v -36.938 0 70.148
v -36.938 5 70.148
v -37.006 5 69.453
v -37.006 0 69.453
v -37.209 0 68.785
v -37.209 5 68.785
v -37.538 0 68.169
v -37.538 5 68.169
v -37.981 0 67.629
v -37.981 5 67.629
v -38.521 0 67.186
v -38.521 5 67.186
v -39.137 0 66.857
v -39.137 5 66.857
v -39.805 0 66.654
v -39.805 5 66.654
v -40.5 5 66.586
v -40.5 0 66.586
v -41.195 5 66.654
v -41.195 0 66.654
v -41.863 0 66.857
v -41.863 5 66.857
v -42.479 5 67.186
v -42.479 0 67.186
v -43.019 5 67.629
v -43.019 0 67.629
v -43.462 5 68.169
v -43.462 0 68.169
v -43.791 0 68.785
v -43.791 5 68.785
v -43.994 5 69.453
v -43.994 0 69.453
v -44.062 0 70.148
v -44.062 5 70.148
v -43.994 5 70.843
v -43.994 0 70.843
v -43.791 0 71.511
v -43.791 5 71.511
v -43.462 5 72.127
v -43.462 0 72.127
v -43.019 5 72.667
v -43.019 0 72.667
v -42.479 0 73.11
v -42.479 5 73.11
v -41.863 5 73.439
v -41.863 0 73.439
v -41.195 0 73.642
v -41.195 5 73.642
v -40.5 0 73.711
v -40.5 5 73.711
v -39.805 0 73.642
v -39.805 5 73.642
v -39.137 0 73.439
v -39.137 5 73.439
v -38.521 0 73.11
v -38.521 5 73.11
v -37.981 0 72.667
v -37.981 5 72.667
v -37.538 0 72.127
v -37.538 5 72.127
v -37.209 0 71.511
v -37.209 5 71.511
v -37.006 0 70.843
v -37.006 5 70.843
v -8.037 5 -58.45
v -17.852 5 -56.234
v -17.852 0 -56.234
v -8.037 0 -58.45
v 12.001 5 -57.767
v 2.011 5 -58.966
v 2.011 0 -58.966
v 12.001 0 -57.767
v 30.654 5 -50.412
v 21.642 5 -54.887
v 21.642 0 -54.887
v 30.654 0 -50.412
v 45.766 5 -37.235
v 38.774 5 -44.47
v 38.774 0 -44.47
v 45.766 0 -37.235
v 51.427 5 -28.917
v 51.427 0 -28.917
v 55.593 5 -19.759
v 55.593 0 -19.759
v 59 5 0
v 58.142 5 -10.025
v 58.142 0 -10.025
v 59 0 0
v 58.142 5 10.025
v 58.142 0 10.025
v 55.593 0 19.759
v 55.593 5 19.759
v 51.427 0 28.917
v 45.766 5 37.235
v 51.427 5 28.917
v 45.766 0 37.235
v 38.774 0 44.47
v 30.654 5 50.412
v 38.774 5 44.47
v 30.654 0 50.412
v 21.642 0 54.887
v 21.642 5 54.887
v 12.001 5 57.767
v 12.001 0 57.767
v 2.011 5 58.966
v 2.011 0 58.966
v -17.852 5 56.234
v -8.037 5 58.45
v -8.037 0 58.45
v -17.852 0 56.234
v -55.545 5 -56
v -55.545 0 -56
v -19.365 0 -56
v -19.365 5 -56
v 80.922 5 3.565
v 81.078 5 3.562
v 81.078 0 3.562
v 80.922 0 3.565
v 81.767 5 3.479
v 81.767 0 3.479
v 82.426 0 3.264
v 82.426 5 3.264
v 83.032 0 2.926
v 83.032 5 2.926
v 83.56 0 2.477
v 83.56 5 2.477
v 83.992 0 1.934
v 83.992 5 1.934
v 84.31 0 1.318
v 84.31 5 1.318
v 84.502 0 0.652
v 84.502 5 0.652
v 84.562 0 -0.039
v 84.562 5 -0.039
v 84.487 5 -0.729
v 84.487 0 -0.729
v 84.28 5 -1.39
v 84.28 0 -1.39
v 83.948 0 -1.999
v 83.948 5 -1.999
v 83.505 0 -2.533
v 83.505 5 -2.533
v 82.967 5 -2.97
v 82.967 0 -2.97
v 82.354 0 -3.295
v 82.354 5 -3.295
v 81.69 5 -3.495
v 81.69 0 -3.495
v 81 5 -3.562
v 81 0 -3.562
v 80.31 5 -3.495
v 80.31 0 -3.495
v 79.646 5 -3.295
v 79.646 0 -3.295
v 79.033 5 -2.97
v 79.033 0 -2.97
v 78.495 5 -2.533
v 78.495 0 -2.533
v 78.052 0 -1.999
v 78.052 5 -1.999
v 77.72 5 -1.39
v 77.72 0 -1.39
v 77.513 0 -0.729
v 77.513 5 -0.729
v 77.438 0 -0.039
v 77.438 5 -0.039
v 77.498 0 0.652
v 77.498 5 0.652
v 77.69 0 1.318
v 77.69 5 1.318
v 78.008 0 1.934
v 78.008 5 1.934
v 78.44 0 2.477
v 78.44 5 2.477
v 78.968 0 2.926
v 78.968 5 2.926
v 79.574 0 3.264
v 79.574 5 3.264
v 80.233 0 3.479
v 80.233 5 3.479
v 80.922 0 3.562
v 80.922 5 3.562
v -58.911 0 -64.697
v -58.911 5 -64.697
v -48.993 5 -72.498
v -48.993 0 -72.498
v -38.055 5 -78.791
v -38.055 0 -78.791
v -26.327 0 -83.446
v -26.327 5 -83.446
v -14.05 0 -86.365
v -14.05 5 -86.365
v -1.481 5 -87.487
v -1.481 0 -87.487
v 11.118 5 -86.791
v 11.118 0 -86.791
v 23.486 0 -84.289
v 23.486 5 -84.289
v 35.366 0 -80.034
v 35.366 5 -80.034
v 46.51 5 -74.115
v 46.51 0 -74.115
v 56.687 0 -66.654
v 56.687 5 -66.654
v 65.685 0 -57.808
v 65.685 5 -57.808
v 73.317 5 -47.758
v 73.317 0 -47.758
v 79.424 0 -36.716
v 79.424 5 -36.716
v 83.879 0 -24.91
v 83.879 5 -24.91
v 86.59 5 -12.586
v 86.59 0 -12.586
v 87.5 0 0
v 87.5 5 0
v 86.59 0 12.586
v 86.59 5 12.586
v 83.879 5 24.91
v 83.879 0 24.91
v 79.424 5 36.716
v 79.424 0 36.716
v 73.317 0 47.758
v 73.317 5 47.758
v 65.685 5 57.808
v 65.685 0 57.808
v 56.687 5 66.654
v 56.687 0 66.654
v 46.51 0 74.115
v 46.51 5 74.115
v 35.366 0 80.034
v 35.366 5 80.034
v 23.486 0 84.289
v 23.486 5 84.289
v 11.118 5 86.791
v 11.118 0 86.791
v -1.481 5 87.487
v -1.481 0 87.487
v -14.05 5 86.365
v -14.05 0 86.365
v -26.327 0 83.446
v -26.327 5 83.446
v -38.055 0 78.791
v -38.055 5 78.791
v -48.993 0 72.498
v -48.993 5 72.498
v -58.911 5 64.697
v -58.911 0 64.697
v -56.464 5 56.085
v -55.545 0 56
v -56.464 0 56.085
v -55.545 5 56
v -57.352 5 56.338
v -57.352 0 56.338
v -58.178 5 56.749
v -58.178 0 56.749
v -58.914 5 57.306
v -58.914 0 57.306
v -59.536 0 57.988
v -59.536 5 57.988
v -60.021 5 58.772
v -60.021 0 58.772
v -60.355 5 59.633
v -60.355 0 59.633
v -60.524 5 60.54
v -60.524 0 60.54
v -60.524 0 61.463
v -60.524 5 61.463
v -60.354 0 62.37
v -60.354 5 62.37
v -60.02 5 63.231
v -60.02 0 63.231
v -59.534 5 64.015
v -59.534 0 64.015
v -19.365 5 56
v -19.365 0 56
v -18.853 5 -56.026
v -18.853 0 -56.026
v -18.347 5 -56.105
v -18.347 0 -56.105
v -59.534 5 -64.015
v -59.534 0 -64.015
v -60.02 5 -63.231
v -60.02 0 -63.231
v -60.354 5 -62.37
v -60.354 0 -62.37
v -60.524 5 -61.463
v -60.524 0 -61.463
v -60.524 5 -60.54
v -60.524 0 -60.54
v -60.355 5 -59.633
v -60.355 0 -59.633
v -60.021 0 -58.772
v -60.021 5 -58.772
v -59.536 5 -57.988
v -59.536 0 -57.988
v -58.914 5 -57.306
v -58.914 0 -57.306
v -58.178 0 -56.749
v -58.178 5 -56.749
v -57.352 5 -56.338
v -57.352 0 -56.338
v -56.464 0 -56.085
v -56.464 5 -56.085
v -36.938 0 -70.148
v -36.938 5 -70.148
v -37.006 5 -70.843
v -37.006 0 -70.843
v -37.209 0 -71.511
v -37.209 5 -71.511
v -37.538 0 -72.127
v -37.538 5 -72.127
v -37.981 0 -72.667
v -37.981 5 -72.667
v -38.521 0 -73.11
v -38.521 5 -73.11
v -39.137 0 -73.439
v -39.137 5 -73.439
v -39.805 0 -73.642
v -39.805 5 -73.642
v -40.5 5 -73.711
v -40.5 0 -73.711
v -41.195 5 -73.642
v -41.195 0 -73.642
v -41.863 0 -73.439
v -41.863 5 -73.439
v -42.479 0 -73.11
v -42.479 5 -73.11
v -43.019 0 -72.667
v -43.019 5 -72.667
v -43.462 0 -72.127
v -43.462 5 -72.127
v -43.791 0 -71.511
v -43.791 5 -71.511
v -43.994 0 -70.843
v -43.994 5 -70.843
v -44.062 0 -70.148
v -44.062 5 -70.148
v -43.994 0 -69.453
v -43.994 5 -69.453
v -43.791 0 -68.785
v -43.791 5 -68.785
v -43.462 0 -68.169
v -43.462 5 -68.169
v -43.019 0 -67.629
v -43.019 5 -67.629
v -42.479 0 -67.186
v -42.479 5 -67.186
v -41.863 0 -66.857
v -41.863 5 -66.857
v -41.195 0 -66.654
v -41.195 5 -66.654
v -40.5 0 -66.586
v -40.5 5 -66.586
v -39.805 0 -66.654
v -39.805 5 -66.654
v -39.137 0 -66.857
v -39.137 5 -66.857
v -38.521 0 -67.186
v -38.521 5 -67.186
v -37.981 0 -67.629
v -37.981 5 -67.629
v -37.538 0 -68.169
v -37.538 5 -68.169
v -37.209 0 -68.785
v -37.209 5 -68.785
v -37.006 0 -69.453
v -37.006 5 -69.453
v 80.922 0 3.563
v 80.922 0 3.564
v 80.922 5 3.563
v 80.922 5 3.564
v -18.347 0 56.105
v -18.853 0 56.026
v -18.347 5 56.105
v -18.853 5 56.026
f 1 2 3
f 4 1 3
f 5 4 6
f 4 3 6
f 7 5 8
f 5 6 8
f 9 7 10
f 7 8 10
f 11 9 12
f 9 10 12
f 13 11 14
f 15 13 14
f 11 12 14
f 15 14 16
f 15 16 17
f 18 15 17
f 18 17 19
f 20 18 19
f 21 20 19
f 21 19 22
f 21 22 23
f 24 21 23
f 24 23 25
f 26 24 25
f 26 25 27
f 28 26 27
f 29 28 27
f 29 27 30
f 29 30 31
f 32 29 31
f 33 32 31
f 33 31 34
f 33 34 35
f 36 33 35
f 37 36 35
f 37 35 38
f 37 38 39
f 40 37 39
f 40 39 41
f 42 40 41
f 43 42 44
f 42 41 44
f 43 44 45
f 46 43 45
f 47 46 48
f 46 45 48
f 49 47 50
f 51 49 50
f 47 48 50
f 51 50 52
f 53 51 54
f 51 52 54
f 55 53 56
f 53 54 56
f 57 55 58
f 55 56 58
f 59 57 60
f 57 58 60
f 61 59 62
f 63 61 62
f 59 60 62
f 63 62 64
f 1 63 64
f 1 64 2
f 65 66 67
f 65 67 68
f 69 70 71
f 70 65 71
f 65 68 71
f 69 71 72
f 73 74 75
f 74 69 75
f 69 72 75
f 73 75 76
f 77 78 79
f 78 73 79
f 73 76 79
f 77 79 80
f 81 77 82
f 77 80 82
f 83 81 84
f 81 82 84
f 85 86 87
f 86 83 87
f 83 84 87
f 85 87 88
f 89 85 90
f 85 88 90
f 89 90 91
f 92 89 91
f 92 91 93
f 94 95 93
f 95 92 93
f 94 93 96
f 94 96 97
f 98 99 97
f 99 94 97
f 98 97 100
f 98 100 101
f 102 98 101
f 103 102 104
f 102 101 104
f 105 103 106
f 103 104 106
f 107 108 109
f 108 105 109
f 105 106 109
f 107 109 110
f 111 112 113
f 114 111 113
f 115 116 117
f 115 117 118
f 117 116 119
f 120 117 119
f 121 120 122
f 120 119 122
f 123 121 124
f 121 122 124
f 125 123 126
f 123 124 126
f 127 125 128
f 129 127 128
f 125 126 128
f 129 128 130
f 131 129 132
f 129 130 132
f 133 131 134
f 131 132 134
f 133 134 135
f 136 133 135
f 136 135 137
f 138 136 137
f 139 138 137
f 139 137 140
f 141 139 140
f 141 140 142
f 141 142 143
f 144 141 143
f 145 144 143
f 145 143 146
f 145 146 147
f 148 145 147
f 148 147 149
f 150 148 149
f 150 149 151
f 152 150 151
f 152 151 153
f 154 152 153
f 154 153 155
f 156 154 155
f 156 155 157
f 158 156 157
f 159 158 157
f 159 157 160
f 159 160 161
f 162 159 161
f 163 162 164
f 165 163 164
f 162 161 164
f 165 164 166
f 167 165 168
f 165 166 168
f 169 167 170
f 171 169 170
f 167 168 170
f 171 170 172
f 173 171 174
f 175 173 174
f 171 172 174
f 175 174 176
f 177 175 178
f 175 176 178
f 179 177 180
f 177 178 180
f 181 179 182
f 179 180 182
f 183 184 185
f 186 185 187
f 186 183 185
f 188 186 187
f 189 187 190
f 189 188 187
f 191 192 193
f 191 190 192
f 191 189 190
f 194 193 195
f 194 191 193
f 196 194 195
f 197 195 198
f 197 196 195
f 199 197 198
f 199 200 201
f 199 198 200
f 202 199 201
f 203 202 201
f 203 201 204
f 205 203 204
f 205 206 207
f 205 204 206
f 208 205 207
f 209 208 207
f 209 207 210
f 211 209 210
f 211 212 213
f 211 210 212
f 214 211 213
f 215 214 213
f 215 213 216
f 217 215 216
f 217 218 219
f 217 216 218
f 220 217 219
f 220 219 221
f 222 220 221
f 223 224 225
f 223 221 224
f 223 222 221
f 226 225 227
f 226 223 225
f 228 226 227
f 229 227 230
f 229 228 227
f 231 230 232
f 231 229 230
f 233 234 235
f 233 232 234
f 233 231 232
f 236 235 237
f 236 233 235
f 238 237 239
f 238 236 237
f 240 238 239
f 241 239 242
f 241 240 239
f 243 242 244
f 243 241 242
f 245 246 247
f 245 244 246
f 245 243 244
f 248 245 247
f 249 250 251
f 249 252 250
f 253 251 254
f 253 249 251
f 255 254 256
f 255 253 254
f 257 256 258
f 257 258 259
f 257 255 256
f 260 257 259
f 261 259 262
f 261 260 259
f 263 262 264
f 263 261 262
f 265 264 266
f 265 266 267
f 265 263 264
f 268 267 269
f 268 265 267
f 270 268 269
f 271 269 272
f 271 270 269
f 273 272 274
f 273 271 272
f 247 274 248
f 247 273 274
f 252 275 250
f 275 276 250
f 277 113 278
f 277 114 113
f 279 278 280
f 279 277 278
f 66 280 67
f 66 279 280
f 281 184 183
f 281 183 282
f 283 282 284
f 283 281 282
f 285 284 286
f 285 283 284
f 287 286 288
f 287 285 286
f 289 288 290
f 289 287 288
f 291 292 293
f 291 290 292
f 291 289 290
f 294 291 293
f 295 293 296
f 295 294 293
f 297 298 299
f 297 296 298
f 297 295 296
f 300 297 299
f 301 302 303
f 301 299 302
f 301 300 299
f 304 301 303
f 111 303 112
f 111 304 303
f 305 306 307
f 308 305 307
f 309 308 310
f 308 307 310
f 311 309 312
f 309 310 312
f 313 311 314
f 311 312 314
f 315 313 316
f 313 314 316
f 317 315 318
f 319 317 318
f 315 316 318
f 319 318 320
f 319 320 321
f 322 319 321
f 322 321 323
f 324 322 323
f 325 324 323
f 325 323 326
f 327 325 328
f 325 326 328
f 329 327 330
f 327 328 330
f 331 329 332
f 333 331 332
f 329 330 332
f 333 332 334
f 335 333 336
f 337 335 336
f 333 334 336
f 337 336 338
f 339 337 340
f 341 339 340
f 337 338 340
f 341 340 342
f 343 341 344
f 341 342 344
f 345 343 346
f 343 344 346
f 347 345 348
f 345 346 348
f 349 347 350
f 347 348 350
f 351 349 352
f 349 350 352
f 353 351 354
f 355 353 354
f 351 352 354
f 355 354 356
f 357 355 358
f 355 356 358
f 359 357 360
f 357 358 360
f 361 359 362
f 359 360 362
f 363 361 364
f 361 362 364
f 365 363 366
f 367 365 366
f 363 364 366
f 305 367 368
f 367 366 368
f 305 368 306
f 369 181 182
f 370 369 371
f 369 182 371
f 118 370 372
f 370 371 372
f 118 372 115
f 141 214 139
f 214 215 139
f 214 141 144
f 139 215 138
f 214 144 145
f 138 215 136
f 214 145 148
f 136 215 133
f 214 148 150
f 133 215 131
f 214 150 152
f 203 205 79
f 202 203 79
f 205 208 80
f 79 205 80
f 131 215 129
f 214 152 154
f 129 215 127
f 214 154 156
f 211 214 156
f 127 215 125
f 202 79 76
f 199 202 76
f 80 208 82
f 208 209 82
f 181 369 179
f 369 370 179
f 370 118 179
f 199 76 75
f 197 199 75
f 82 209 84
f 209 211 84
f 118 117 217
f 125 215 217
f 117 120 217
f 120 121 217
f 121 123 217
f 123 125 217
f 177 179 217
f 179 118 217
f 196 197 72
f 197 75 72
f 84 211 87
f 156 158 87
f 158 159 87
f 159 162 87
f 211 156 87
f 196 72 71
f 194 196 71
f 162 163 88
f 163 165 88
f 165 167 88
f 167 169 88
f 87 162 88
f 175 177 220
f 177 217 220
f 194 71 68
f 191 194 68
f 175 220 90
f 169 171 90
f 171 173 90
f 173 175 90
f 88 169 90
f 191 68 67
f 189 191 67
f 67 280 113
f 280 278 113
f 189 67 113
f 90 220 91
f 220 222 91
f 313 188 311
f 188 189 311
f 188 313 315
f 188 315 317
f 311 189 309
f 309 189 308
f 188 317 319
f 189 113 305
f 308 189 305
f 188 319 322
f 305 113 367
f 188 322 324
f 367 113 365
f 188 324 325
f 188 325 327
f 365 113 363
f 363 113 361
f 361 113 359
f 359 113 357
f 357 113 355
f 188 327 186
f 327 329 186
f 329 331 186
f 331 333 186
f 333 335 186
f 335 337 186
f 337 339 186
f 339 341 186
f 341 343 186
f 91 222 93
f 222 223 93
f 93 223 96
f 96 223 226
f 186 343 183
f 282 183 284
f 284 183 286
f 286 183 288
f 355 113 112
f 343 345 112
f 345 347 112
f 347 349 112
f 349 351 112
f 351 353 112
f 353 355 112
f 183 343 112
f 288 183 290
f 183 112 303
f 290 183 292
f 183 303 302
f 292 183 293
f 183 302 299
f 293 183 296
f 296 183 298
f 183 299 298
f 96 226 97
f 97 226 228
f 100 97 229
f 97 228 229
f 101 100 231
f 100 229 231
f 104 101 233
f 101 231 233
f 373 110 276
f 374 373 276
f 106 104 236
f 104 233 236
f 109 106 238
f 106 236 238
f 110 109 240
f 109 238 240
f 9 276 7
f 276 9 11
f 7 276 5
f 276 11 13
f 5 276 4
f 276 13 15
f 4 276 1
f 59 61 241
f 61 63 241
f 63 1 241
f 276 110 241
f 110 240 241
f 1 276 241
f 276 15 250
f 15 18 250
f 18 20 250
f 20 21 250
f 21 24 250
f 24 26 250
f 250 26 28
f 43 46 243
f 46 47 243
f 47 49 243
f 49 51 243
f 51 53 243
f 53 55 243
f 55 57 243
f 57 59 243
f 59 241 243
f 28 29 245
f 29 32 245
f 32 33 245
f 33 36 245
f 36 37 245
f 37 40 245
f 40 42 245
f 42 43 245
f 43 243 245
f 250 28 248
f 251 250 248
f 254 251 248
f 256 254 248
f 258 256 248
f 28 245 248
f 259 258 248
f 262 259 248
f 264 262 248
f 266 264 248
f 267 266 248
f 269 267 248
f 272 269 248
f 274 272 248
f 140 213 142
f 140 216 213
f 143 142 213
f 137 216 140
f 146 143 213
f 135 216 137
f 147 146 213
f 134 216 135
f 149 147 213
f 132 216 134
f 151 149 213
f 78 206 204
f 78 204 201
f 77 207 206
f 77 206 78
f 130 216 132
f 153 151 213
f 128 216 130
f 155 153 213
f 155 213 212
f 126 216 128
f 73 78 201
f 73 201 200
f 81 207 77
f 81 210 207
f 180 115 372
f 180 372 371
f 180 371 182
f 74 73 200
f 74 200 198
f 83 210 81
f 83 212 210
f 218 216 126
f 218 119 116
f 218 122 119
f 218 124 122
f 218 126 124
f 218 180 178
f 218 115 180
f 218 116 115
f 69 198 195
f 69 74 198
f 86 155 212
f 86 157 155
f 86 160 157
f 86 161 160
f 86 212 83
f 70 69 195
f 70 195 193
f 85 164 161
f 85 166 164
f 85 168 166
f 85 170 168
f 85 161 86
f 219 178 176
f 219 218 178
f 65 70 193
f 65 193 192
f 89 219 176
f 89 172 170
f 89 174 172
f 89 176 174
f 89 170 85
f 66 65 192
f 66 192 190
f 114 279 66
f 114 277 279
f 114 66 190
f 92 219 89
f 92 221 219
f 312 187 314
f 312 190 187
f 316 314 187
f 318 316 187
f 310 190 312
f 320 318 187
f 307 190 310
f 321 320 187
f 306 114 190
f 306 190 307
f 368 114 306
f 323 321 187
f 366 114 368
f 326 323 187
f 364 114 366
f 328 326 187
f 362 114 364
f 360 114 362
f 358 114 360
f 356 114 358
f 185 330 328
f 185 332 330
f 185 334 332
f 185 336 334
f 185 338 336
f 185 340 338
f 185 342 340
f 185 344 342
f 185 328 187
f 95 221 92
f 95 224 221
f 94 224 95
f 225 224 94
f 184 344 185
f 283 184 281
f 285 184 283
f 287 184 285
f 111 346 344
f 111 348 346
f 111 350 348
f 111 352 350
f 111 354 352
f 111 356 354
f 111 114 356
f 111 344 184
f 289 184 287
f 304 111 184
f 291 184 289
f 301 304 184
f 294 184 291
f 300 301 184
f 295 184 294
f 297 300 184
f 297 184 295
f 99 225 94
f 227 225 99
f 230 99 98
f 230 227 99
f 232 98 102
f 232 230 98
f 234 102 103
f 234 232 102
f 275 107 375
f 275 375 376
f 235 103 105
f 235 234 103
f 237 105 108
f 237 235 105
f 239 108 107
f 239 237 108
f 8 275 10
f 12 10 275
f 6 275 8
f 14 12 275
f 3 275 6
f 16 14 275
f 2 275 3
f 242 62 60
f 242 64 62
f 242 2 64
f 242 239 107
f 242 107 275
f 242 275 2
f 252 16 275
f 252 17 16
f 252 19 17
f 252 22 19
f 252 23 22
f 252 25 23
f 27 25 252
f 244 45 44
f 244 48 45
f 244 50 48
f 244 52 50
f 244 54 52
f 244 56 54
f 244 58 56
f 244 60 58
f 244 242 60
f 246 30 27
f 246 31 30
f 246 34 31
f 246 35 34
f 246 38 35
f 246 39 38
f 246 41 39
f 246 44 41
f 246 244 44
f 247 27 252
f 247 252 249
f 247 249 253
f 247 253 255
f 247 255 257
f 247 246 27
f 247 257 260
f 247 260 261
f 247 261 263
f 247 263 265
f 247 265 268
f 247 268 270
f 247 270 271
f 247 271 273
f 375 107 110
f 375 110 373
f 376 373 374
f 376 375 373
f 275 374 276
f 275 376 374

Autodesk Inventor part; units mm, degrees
ref_plane "YZ Plane" through (0, 0, 0) normal (1, 0, 0) x (0, 1, 0)
ref_plane "XZ Plane" through (0, 0, 0) normal (0, 1, 0) x (-1, 0, 0)
ref_plane "XY Plane" through (0, 0, 0) normal (0, 0, 1) x (1, 0, 0)
sketch "Sketch1" plane through (0, 0, 0) normal (0, 1, 0) x (-1, 0, 0)
  circle A0 centre (0, 0) radius 59
  circle A1 centre (0, 0) radius 81
  circle A2 centre (0, 0) radius 87.5
  line L0 (90, -56) -> (15, -56)
  line L1 (10, -51) -> (10, 51)
  line L2 (15, 56) -> (90, 56)
  line L3 (90, 56) -> (90, -56)
  line L4 (90, -56) -> (10, 56) construction
  line L5 (10, -56) -> (90, 56) construction
  arc A3 (10, -51) -> (15, -56) centre (15, -51) ccw
  arc A4 (15, 56) -> (10, 51) centre (15, 51) ccw
  point P0 (50, 0)
  point P1 (90, 0)
  point P2 (10, 0)
  point P3 (60, -54.4151)
  point P4 (60, 54.4151)
  point P5 (80, 35.4436)
  point P6 (80, -35.4436)
  point P7 (67.2328, 56)
  point P8 (67.2328, -56)
  dimension "d0" = 118
  dimension "d1" = 162
  dimension "d2" = 175
  dimension "d7" = 112
  dimension "d9" = 80
  dimension "d10" = 10
  dimension "d11" = 5
extrude "Extrusion1" add sketch "Sketch1" along normal blind 5 contours A0 L0 A1 L2 | A1 L0 A2 L2 picked at (42.125, 58.7621) picked at (-85.0936, 2.0693)
fillet "Fillet1" radius 5 4 edges at (-67.2328, 2.5, -56) (-67.2328, 2.5, 56) (-18.5742, 2.5, -56) (-18.5742, 2.5, 56)
sketch "Sketch2" plane through (0, 5, 0) normal (0, 1, 0) x (1, 0, 0)
  circle A0 centre (0, 0) radius 70.375
  line L0 (-36.4414, 79.1184) -> (-50.2978, 71.1184)
  line L1 (-50.2978, 71.1184) -> (-44.9056, 61.7788)
  arc A1 (-31.0492, 69.7788) -> (-44.9056, 61.7788) centre (0, 0) ccw
  line L2 (-31.0492, 69.7788) -> (-36.4414, 79.1184)
  circle A2 centre (-40.5, 70.1481) radius 3.5625
  circle A3 centre (-40.5, 70.1481) radius 3.5625
  line L3 (86.7392, -8) -> (86.7392, 8)
  line L4 (86.7392, 8) -> (75.9549, 8)
  arc A4 (75.9549, -8) -> (75.9549, 8) centre (0, 0) ccw
  line L5 (75.9549, -8) -> (86.7392, -8)
  arc A5 (80.9215, -3.5651) -> (80.9217, -3.5616) centre (0, 0) ccw
  arc A6 (81.0783, -3.5616) -> (80.9217, -3.5616) centre (81, 0) ccw
  line L6 (81.0783, -3.5616) -> (80.9215, -3.5651)
  line L7 (-50.2978, -71.1184) -> (-36.4414, -79.1184)
  line L8 (-36.4414, -79.1184) -> (-31.0492, -69.7788)
  arc A7 (-44.9056, -61.7788) -> (-31.0492, -69.7788) centre (0, 0) ccw
  line L9 (-44.9056, -61.7788) -> (-50.2978, -71.1184)
  circle A8 centre (-40.5, -70.1481) radius 3.5625
  point P0 (-65.1143, 450.6181)
extrude "Extrusion2" cut sketch "Sketch2" against normal blind 10 contours A2 | A5 A6 L6 | A8
properties part number "Cylinder Segment Holder"
